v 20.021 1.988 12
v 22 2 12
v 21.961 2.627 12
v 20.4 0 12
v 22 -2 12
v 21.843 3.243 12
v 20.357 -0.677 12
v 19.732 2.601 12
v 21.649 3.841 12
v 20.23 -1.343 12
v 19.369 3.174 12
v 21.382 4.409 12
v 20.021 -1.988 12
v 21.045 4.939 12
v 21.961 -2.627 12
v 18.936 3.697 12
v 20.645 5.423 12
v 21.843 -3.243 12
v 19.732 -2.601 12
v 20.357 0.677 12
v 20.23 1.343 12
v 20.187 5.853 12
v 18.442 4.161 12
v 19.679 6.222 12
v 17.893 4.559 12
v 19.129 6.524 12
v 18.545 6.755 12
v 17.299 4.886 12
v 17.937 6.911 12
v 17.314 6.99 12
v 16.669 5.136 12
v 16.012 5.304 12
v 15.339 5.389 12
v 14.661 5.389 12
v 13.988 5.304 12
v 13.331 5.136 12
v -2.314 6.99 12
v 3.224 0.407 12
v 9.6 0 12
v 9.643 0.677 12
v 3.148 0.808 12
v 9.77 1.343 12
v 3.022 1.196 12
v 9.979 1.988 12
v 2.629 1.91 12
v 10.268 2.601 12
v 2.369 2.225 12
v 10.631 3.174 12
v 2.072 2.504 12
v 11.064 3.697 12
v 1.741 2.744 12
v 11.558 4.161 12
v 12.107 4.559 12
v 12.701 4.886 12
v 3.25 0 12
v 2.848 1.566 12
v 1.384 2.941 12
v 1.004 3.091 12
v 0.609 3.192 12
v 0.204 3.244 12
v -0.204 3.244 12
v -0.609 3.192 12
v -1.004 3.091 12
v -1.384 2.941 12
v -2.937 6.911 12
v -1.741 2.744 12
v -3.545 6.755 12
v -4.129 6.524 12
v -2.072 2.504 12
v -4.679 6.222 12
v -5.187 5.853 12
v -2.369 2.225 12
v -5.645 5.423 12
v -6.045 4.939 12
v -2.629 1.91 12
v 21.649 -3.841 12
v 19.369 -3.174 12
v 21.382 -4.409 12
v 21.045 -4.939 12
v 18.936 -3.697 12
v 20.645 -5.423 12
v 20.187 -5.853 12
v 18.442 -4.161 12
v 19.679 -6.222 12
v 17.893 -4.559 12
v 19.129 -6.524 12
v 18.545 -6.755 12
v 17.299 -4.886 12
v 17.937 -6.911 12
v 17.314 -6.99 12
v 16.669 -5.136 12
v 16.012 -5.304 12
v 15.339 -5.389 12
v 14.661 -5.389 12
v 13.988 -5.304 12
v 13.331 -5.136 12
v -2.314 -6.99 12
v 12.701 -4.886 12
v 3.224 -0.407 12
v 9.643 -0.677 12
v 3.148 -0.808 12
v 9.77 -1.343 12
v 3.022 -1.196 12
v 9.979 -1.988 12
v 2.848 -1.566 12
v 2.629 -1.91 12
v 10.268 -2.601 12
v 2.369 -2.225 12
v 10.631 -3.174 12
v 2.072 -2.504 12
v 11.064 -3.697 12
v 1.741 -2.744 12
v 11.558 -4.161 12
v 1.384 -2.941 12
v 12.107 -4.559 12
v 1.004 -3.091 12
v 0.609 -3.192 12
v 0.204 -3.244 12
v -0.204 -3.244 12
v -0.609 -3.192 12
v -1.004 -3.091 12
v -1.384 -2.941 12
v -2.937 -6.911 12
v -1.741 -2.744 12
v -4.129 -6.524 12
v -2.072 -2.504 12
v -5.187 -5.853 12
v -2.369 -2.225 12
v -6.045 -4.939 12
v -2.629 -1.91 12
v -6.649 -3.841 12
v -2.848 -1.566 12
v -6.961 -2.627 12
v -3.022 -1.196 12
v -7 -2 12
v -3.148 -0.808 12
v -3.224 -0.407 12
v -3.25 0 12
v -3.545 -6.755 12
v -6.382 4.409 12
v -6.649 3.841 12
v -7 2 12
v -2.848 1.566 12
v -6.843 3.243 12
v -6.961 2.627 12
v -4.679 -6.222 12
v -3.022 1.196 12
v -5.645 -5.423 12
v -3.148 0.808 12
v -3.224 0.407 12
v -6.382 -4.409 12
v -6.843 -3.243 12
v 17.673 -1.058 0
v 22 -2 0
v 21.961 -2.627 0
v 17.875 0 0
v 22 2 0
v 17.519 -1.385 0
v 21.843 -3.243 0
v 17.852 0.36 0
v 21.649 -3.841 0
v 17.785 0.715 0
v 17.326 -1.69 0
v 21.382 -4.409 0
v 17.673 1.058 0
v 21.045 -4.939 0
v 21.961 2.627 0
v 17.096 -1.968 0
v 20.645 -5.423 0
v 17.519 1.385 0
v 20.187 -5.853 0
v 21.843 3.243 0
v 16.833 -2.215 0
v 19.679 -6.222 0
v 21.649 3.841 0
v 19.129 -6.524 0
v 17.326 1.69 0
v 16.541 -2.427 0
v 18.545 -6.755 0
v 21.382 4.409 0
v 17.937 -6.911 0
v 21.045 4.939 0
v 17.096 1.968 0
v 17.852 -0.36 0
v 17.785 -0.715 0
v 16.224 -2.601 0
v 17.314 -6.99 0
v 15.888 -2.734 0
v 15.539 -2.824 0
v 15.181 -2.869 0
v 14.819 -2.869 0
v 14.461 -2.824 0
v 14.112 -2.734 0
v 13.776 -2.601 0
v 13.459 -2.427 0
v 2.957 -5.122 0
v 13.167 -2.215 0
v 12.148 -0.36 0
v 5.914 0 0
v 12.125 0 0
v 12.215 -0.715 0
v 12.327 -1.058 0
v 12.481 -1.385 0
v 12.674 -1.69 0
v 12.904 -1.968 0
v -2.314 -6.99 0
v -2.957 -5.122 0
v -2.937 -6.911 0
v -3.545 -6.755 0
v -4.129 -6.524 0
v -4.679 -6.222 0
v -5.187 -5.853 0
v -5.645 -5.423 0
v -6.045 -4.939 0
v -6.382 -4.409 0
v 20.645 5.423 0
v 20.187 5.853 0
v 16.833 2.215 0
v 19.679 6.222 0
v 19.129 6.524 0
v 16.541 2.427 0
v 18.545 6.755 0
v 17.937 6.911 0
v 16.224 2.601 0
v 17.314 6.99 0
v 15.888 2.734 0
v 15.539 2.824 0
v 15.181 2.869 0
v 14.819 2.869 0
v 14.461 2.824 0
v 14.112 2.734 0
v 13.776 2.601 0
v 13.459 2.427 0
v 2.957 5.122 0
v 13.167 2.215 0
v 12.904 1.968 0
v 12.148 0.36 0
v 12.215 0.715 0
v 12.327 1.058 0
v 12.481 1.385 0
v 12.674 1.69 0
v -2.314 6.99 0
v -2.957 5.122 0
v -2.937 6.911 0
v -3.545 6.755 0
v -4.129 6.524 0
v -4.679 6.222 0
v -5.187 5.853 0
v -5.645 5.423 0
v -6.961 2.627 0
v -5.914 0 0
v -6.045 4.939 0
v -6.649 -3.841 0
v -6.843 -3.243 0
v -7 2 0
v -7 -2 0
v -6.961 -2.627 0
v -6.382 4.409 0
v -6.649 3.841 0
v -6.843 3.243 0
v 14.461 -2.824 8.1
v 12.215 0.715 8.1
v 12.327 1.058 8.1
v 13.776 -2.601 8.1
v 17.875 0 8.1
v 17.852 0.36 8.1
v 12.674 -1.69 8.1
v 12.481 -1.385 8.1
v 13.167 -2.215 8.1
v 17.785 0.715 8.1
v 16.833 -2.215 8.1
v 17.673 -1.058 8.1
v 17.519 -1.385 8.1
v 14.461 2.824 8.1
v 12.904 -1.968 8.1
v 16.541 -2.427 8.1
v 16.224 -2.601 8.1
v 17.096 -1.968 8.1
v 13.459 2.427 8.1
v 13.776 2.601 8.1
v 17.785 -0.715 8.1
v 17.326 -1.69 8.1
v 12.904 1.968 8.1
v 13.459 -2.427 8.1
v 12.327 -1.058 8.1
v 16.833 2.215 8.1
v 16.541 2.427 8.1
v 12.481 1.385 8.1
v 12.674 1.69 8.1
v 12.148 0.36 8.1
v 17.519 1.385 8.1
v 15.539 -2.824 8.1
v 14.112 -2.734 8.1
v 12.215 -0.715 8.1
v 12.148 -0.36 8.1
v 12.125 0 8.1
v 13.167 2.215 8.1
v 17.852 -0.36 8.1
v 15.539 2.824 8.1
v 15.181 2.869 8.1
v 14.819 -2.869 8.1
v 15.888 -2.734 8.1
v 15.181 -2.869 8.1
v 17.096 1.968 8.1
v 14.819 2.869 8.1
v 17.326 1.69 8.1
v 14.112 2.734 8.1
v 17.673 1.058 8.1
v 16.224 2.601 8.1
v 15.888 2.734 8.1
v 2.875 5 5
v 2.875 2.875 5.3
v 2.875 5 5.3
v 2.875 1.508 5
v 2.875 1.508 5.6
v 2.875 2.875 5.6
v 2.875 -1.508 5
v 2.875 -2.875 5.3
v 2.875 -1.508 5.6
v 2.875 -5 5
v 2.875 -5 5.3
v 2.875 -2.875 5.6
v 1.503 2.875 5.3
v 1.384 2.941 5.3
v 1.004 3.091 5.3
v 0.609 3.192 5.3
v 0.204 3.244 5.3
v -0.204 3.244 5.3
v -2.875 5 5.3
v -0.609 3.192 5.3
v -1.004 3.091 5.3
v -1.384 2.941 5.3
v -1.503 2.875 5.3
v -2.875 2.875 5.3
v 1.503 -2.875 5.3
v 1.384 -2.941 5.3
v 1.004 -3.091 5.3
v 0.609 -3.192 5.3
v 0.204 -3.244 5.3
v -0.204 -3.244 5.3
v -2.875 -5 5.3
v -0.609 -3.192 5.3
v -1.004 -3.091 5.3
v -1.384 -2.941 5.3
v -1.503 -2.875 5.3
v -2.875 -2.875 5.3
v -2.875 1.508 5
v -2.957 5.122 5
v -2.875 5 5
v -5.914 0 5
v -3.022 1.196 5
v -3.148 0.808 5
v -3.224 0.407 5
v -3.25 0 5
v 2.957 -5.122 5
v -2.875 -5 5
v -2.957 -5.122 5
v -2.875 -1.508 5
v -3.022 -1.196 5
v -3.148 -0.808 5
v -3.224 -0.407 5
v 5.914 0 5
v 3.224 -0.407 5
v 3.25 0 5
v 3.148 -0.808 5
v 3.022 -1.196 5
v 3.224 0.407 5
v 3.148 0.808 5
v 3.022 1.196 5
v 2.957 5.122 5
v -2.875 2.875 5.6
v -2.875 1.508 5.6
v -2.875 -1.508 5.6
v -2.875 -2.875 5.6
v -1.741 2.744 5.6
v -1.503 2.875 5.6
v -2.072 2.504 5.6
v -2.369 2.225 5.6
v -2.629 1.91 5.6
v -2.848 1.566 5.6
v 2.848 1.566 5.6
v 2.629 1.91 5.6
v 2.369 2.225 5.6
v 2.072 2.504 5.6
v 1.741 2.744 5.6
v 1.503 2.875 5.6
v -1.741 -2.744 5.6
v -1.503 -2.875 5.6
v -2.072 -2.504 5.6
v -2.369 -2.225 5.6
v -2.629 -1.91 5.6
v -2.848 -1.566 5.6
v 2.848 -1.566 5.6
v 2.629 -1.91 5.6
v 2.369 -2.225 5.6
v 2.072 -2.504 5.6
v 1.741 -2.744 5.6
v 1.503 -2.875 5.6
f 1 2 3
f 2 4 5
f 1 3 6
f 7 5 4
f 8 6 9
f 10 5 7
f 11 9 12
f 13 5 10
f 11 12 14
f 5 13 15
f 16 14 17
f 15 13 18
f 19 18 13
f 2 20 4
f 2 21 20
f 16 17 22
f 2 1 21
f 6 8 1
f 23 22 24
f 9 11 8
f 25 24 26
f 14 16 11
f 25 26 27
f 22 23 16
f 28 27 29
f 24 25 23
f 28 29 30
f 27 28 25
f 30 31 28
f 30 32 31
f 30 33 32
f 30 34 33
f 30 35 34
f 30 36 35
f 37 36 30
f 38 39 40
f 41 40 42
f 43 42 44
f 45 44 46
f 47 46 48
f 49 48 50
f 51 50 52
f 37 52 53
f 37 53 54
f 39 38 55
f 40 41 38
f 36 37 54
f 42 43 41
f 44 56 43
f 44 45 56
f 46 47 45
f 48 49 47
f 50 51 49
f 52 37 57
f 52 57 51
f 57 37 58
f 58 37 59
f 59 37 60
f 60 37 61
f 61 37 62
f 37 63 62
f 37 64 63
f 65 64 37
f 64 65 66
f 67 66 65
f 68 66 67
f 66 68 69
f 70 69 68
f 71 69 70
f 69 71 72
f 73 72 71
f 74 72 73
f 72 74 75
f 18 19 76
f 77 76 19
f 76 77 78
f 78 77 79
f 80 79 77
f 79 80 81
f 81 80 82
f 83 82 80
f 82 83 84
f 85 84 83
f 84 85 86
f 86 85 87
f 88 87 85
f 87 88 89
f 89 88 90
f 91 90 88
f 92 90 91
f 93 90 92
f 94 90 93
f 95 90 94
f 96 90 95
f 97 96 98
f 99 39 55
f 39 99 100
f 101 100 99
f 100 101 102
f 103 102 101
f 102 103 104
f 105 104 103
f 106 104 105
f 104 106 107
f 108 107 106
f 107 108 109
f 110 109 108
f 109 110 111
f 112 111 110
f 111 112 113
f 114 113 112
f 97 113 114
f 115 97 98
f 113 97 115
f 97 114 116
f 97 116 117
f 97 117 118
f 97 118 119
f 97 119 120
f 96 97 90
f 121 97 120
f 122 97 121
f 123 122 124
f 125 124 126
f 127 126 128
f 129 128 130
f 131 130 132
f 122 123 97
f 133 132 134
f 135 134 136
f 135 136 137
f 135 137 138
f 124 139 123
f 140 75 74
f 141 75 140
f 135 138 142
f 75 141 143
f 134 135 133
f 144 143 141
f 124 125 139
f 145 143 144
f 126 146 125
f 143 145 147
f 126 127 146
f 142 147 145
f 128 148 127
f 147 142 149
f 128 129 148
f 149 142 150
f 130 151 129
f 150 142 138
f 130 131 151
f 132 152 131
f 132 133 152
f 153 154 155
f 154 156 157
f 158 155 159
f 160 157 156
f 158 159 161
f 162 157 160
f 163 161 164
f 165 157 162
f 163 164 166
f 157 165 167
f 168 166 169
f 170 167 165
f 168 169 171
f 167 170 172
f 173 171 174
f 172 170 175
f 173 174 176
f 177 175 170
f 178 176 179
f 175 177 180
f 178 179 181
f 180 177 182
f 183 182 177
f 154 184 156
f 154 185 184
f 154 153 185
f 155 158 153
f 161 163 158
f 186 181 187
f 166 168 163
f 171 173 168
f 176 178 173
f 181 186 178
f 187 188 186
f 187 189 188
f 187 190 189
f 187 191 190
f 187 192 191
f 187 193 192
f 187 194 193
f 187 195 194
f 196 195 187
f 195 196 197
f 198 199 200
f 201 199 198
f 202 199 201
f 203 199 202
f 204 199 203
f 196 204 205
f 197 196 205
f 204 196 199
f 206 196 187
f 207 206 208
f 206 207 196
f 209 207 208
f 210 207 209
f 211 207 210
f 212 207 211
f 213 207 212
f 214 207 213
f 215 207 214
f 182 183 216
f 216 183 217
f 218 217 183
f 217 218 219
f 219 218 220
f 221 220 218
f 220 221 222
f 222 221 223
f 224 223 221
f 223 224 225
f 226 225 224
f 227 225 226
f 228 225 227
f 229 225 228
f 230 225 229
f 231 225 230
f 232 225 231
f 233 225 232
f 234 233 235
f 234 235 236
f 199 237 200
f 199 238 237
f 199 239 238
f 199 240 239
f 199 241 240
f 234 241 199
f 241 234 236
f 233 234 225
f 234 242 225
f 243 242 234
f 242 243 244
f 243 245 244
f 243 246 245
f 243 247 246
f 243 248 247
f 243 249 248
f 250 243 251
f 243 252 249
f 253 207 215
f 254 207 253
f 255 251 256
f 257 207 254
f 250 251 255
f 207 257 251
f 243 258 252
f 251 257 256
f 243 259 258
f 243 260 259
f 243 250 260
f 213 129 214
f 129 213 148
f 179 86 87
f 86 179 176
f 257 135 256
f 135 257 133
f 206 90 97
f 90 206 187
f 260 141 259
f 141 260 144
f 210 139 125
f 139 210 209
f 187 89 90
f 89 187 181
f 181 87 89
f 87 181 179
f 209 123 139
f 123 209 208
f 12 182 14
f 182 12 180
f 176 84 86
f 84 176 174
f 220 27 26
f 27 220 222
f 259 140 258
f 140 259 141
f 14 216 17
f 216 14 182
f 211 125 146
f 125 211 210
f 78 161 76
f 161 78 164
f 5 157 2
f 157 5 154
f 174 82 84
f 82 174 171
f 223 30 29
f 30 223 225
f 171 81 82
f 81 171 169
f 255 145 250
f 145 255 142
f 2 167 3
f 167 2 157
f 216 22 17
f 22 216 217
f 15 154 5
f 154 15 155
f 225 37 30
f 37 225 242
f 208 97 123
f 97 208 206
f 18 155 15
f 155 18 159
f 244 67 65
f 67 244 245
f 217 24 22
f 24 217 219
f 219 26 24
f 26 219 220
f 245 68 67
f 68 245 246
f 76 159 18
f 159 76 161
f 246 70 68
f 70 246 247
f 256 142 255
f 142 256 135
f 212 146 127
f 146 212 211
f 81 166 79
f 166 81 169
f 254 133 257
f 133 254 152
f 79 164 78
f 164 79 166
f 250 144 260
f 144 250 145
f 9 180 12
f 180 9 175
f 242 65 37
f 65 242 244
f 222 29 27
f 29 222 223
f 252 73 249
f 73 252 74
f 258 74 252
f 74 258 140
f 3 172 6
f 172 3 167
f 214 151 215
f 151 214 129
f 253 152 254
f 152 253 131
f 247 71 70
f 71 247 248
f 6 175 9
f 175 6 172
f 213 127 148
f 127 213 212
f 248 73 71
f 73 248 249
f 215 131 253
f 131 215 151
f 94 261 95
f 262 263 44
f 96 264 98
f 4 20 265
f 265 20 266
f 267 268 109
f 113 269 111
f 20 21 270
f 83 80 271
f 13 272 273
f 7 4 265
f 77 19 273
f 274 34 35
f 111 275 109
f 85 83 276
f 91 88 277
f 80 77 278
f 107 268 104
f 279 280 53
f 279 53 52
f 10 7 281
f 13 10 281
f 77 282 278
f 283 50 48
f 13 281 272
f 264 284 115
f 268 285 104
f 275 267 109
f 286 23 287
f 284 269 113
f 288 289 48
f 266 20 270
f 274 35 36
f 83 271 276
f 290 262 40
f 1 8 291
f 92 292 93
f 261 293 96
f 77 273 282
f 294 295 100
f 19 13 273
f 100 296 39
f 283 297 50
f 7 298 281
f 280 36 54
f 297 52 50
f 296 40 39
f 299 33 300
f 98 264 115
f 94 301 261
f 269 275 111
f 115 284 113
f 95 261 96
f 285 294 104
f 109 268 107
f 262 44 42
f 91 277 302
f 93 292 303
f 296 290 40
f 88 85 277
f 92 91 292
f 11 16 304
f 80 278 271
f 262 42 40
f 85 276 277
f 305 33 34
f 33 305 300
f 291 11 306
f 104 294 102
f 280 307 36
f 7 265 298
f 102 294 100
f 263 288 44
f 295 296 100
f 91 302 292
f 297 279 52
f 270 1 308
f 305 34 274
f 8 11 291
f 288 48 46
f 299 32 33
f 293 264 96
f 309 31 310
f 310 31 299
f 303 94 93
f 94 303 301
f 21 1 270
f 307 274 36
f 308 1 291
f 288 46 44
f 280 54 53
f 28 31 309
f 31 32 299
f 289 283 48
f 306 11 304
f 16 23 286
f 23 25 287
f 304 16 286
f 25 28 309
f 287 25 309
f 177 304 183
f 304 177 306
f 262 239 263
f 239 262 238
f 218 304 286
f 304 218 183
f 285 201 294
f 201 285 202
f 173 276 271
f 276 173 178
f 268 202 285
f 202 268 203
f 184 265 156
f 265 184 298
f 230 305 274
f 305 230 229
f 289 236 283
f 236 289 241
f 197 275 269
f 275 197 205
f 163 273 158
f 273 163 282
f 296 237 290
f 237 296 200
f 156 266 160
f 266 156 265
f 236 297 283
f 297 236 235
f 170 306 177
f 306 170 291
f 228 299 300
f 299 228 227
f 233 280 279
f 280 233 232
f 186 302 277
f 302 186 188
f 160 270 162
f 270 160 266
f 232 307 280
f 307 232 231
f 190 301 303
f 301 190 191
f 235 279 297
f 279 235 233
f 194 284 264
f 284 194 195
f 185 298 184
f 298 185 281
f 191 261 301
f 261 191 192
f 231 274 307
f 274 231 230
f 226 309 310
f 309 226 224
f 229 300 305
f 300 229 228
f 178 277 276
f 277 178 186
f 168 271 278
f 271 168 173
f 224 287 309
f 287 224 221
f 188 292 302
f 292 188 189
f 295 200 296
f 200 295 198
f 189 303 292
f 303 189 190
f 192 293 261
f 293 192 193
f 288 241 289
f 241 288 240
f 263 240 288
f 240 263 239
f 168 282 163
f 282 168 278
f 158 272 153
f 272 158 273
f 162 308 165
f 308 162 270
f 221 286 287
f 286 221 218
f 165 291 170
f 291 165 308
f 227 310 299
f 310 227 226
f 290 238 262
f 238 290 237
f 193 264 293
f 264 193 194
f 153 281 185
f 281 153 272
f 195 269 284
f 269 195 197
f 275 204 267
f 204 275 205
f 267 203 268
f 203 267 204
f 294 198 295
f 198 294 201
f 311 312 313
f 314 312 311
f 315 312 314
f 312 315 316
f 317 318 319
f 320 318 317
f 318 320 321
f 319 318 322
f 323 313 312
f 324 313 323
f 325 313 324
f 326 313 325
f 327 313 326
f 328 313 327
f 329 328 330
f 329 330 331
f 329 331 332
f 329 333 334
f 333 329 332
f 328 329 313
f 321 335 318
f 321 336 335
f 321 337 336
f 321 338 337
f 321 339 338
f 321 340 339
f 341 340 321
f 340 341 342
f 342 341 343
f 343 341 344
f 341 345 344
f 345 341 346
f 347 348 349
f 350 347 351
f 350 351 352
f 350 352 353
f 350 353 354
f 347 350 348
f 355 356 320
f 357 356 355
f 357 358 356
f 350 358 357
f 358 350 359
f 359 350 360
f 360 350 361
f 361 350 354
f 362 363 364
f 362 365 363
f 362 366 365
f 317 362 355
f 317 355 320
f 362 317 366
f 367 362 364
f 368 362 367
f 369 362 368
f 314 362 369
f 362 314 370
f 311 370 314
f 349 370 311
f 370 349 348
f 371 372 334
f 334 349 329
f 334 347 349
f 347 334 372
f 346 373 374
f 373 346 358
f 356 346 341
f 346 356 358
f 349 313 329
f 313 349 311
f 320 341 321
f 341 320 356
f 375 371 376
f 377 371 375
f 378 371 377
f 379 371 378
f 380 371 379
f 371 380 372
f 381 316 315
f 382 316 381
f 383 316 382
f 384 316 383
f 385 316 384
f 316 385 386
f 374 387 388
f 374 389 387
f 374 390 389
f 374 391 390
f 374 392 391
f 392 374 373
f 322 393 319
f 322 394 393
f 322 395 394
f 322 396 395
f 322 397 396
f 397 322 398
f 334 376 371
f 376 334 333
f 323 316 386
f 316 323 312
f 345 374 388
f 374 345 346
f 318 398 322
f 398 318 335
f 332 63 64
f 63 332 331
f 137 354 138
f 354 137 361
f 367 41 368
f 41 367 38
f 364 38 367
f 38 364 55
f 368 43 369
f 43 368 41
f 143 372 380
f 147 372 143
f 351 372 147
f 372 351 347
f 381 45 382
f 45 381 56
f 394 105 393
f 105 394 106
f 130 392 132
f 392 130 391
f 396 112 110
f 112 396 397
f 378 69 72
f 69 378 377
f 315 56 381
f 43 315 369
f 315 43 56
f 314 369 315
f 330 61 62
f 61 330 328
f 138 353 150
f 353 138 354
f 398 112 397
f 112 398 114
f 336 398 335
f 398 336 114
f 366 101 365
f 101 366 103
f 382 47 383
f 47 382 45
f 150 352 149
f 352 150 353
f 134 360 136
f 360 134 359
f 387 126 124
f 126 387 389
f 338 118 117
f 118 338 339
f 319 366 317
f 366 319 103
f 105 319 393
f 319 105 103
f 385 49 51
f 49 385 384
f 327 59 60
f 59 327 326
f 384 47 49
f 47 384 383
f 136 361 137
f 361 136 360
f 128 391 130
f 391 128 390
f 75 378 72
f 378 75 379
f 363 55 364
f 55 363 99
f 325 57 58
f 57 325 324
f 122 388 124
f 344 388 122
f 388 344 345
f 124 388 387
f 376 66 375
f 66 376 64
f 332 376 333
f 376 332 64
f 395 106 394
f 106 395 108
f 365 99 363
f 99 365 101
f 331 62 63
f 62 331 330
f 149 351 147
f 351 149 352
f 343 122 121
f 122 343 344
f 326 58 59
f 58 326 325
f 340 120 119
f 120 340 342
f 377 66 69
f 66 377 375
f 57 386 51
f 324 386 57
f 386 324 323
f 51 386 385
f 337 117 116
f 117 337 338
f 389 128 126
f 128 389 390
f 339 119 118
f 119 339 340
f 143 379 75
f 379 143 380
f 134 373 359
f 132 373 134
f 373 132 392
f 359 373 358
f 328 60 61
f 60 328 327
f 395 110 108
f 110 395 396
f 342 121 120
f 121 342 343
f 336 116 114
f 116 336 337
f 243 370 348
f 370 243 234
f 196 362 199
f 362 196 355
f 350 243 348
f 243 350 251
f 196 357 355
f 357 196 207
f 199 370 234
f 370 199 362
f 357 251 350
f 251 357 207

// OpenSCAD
$fn = 50;


difference() {
	union() {
		cylinder(h = 12, r = 7.0000000000);
		translate(v = [7.5000000000, 0.0000000000, 0]) {
			hull() {
				translate(v = [-9.5000000000, 2.0000000000, 0]) {
					cylinder(h = 12, r = 5);
				}
				translate(v = [9.5000000000, 2.0000000000, 0]) {
					cylinder(h = 12, r = 5);
				}
				translate(v = [-9.5000000000, -2.0000000000, 0]) {
					cylinder(h = 12, r = 5);
				}
				translate(v = [9.5000000000, -2.0000000000, 0]) {
					cylinder(h = 12, r = 5);
				}
			}
		}
		translate(v = [7.5000000000, 0.0000000000, 0]) {
			hull() {
				translate(v = [-9.5000000000, 2.0000000000, 0]) {
					cylinder(h = 12, r = 5);
				}
				translate(v = [9.5000000000, 2.0000000000, 0]) {
					cylinder(h = 12, r = 5);
				}
				translate(v = [-9.5000000000, -2.0000000000, 0]) {
					cylinder(h = 12, r = 5);
				}
				translate(v = [9.5000000000, -2.0000000000, 0]) {
					cylinder(h = 12, r = 5);
				}
			}
		}
	}
	union() {
		translate(v = [15.0000000000, 0.0000000000, 12]) {
			rotate(a = [0, 0, 0]) {
				difference() {
					union() {
						#translate(v = [0, 0, -12.0000000000]) {
							cylinder(h = 12, r = 2.6000000000);
						}
						#translate(v = [0, 0, -3.9000000000]) {
							cylinder(h = 3.9000000000, r1 = 2.8750000000, r2 = 5.4000000000);
						}
						#translate(v = [0, 0, -12.0000000000]) {
							cylinder(h = 12, r = 2.8750000000);
						}
						#translate(v = [0, 0, -12.0000000000]) {
							cylinder(h = 12, r = 2.6000000000);
						}
					}
					union();
				}
			}
		}
		translate(v = [15.0000000000, 0.0000000000, 12]) {
			rotate(a = [0, 0, 0]) {
				difference() {
					union() {
						#translate(v = [0, 0, -12.0000000000]) {
							cylinder(h = 12, r = 2.6000000000);
						}
						#translate(v = [0, 0, -3.9000000000]) {
							cylinder(h = 3.9000000000, r1 = 2.8750000000, r2 = 5.4000000000);
						}
						#translate(v = [0, 0, -12.0000000000]) {
							cylinder(h = 12, r = 2.8750000000);
						}
						#translate(v = [0, 0, -12.0000000000]) {
							cylinder(h = 12, r = 2.6000000000);
						}
					}
					union();
				}
			}
		}
		translate(v = [0.0000000000, 0.0000000000, 0]) {
			rotate(a = [0, 0, 0]) {
				difference() {
					union() {
						#translate(v = [-2.8750000000, -5.0000000000, -0.3000000000]) {
							cube(size = [5.7500000000, 10, 0.3000000000]);
						}
						#translate(v = [-2.8750000000, -2.8750000000, -0.6000000000]) {
							cube(size = [5.7500000000, 5.7500000000, 0.3000000000]);
						}
						#translate(v = [-2.8750000000, -5.0000000000, 5]) {
							cube(size = [5.7500000000, 10, 0.3000000000]);
						}
						#translate(v = [-2.8750000000, -2.8750000000, 5.3000000000]) {
							cube(size = [5.7500000000, 5.7500000000, 0.3000000000]);
						}
						#translate(v = [0, 0, -100.0000000000]) {
							cylinder(h = 200, r = 3.2500000000);
						}
						#linear_extrude(height = 5) {
							polygon(points = [[5.9142500000, 0.0000000000], [2.9571250000, 5.1218907443], [-2.9571250000, 5.1218907443], [-5.9142500000, 0.0000000000], [-2.9571250000, -5.1218907443], [2.9571250000, -5.1218907443]]);
						}
						#translate(v = [-2.8750000000, -5.0000000000, -0.3000000000]) {
							cube(size = [5.7500000000, 10, 0.3000000000]);
						}
						#translate(v = [-2.8750000000, -2.8750000000, -0.6000000000]) {
							cube(size = [5.7500000000, 5.7500000000, 0.3000000000]);
						}
						#translate(v = [-2.8750000000, -5.0000000000, 5]) {
							cube(size = [5.7500000000, 10, 0.3000000000]);
						}
						#translate(v = [-2.8750000000, -2.8750000000, 5.3000000000]) {
							cube(size = [5.7500000000, 5.7500000000, 0.3000000000]);
						}
						#translate(v = [0, 0, -100.0000000000]) {
							cylinder(h = 200, r = 3.2500000000);
						}
						#translate(v = [-2.8750000000, -5.0000000000, -0.3000000000]) {
							cube(size = [5.7500000000, 10, 0.3000000000]);
						}
						#translate(v = [-2.8750000000, -2.8750000000, -0.6000000000]) {
							cube(size = [5.7500000000, 5.7500000000, 0.3000000000]);
						}
						#translate(v = [-2.8750000000, -5.0000000000, 5]) {
							cube(size = [5.7500000000, 10, 0.3000000000]);
						}
						#translate(v = [-2.8750000000, -2.8750000000, 5.3000000000]) {
							cube(size = [5.7500000000, 5.7500000000, 0.3000000000]);
						}
						#translate(v = [0, 0, -100.0000000000]) {
							cylinder(h = 200, r = 3.2500000000);
						}
					}
					union();
				}
			}
		}
		translate(v = [0, 0, -100]) {
			cylinder(h = 200, r = 3.2500000000);
		}
		translate(v = [0, 0, -100]) {
			cylinder(h = 200, r = 1.8000000000);
		}
	}
}
